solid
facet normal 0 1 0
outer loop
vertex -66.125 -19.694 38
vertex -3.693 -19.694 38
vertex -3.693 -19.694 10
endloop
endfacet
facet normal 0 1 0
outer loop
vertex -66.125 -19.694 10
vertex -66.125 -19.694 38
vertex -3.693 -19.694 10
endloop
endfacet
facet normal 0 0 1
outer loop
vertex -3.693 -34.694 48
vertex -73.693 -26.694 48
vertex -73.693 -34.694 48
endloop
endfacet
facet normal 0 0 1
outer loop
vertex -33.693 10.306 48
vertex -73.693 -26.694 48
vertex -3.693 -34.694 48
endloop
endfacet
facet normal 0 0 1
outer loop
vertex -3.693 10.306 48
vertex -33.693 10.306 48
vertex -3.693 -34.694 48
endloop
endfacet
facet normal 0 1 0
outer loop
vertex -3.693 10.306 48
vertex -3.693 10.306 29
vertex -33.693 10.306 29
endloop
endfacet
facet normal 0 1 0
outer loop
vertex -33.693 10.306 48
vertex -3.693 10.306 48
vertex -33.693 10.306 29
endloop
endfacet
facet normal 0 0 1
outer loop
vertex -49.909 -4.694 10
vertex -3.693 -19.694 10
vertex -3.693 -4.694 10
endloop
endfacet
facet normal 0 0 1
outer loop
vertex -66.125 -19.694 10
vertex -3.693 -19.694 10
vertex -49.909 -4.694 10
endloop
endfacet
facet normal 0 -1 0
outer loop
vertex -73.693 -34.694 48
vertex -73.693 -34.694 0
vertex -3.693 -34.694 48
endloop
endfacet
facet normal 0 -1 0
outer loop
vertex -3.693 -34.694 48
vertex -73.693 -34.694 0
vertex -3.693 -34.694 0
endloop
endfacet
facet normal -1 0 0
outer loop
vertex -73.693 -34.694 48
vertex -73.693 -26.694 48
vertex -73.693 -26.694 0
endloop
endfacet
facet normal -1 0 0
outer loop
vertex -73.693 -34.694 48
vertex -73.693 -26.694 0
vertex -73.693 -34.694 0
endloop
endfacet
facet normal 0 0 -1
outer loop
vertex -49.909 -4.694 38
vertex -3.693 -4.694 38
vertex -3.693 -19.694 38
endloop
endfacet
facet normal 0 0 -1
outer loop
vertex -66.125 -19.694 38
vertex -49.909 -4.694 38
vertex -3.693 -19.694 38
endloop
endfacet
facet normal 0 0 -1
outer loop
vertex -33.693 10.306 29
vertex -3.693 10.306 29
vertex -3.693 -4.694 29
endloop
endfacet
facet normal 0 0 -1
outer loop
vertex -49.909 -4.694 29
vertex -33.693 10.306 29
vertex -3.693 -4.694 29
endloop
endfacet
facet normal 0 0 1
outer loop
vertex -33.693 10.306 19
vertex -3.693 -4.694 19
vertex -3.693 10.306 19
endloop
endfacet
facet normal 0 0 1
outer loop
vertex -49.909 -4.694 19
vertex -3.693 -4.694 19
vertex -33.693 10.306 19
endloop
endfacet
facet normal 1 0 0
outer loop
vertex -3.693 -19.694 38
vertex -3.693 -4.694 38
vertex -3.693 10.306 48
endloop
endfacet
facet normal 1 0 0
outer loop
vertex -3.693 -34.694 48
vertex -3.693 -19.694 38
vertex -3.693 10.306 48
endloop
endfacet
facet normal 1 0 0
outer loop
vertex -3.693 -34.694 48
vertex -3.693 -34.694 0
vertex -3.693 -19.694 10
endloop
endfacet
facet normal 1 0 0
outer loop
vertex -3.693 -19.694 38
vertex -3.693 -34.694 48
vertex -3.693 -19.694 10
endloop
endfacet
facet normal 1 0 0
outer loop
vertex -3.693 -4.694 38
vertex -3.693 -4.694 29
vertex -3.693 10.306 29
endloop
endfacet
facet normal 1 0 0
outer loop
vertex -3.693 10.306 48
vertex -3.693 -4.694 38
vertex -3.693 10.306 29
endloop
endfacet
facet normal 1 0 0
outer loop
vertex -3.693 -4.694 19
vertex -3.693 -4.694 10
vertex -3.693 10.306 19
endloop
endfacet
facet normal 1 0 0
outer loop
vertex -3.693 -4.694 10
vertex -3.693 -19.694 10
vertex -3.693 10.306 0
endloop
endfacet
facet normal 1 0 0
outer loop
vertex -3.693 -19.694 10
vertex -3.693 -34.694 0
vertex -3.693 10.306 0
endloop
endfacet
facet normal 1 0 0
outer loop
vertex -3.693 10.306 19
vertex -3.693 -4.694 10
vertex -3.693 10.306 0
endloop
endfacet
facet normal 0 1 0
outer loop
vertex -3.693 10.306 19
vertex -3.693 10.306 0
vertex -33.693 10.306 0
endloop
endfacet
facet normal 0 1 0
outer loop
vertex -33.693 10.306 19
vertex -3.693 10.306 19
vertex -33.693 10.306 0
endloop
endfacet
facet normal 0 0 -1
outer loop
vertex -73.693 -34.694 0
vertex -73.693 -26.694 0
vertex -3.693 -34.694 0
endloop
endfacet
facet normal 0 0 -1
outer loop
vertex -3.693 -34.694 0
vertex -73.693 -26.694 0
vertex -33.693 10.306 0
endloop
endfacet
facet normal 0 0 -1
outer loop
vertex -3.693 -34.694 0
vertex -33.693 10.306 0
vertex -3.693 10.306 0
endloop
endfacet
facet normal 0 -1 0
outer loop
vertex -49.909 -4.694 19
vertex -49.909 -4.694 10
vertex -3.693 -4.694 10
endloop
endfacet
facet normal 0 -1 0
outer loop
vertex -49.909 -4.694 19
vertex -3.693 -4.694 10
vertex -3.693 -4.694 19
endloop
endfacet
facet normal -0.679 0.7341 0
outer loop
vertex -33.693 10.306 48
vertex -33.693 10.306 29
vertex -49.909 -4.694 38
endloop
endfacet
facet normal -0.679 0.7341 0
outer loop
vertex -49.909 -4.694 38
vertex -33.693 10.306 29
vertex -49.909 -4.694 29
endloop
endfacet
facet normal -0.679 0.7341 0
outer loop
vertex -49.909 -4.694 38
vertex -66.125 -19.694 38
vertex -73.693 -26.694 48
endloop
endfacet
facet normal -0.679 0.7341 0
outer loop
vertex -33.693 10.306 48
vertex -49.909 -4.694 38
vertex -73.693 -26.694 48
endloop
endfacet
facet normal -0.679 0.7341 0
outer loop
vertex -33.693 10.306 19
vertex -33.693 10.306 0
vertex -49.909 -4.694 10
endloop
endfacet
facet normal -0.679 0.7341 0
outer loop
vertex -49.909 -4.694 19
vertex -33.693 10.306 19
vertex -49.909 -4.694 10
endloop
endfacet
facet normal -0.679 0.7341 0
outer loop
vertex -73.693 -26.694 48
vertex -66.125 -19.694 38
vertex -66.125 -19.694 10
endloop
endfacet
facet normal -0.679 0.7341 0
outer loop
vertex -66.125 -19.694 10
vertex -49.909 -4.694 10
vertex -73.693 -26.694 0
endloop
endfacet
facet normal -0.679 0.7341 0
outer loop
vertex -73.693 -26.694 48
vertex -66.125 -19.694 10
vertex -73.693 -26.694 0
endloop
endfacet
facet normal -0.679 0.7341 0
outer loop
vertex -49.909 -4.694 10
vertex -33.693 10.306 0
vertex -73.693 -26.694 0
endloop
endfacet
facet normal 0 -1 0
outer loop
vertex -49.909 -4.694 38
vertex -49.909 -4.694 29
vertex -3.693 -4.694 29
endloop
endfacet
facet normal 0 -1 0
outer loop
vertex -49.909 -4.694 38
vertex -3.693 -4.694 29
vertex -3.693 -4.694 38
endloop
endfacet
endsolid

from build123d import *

# Parameters (mm, degrees)
BOSS_EXTRUDE1_DEPTH = 48
CUT_EXTRUDE1_DEPTH  = 70


with BuildPart() as part:
    # Sketch1 → Boss-Extrude1 (new body)
    with BuildSketch(Plane.XY):
        Polygon((-73.692653745, -34.694240524), (-3.692653745, -34.694240524), (-3.692653745, 10.305759476), (-33.692653745, 10.305759476), (-73.692653745, -26.694240524), align=None)
    extrude(amount=BOSS_EXTRUDE1_DEPTH)

    # Sketch2 → Cut-Extrude1 (cut)
    with BuildSketch(Plane.ZY.offset(73.692653745)):
        Polygon((19, 10.305759476), (29, 10.305759476), (29, -4.694240524), (38, -4.694240524), (38, -19.694240524), (10, -19.694240524), (10, -4.694240524), (19, -4.694240524), align=None)
    extrude(amount=-CUT_EXTRUDE1_DEPTH, mode=Mode.SUBTRACT)


solid = part.part
